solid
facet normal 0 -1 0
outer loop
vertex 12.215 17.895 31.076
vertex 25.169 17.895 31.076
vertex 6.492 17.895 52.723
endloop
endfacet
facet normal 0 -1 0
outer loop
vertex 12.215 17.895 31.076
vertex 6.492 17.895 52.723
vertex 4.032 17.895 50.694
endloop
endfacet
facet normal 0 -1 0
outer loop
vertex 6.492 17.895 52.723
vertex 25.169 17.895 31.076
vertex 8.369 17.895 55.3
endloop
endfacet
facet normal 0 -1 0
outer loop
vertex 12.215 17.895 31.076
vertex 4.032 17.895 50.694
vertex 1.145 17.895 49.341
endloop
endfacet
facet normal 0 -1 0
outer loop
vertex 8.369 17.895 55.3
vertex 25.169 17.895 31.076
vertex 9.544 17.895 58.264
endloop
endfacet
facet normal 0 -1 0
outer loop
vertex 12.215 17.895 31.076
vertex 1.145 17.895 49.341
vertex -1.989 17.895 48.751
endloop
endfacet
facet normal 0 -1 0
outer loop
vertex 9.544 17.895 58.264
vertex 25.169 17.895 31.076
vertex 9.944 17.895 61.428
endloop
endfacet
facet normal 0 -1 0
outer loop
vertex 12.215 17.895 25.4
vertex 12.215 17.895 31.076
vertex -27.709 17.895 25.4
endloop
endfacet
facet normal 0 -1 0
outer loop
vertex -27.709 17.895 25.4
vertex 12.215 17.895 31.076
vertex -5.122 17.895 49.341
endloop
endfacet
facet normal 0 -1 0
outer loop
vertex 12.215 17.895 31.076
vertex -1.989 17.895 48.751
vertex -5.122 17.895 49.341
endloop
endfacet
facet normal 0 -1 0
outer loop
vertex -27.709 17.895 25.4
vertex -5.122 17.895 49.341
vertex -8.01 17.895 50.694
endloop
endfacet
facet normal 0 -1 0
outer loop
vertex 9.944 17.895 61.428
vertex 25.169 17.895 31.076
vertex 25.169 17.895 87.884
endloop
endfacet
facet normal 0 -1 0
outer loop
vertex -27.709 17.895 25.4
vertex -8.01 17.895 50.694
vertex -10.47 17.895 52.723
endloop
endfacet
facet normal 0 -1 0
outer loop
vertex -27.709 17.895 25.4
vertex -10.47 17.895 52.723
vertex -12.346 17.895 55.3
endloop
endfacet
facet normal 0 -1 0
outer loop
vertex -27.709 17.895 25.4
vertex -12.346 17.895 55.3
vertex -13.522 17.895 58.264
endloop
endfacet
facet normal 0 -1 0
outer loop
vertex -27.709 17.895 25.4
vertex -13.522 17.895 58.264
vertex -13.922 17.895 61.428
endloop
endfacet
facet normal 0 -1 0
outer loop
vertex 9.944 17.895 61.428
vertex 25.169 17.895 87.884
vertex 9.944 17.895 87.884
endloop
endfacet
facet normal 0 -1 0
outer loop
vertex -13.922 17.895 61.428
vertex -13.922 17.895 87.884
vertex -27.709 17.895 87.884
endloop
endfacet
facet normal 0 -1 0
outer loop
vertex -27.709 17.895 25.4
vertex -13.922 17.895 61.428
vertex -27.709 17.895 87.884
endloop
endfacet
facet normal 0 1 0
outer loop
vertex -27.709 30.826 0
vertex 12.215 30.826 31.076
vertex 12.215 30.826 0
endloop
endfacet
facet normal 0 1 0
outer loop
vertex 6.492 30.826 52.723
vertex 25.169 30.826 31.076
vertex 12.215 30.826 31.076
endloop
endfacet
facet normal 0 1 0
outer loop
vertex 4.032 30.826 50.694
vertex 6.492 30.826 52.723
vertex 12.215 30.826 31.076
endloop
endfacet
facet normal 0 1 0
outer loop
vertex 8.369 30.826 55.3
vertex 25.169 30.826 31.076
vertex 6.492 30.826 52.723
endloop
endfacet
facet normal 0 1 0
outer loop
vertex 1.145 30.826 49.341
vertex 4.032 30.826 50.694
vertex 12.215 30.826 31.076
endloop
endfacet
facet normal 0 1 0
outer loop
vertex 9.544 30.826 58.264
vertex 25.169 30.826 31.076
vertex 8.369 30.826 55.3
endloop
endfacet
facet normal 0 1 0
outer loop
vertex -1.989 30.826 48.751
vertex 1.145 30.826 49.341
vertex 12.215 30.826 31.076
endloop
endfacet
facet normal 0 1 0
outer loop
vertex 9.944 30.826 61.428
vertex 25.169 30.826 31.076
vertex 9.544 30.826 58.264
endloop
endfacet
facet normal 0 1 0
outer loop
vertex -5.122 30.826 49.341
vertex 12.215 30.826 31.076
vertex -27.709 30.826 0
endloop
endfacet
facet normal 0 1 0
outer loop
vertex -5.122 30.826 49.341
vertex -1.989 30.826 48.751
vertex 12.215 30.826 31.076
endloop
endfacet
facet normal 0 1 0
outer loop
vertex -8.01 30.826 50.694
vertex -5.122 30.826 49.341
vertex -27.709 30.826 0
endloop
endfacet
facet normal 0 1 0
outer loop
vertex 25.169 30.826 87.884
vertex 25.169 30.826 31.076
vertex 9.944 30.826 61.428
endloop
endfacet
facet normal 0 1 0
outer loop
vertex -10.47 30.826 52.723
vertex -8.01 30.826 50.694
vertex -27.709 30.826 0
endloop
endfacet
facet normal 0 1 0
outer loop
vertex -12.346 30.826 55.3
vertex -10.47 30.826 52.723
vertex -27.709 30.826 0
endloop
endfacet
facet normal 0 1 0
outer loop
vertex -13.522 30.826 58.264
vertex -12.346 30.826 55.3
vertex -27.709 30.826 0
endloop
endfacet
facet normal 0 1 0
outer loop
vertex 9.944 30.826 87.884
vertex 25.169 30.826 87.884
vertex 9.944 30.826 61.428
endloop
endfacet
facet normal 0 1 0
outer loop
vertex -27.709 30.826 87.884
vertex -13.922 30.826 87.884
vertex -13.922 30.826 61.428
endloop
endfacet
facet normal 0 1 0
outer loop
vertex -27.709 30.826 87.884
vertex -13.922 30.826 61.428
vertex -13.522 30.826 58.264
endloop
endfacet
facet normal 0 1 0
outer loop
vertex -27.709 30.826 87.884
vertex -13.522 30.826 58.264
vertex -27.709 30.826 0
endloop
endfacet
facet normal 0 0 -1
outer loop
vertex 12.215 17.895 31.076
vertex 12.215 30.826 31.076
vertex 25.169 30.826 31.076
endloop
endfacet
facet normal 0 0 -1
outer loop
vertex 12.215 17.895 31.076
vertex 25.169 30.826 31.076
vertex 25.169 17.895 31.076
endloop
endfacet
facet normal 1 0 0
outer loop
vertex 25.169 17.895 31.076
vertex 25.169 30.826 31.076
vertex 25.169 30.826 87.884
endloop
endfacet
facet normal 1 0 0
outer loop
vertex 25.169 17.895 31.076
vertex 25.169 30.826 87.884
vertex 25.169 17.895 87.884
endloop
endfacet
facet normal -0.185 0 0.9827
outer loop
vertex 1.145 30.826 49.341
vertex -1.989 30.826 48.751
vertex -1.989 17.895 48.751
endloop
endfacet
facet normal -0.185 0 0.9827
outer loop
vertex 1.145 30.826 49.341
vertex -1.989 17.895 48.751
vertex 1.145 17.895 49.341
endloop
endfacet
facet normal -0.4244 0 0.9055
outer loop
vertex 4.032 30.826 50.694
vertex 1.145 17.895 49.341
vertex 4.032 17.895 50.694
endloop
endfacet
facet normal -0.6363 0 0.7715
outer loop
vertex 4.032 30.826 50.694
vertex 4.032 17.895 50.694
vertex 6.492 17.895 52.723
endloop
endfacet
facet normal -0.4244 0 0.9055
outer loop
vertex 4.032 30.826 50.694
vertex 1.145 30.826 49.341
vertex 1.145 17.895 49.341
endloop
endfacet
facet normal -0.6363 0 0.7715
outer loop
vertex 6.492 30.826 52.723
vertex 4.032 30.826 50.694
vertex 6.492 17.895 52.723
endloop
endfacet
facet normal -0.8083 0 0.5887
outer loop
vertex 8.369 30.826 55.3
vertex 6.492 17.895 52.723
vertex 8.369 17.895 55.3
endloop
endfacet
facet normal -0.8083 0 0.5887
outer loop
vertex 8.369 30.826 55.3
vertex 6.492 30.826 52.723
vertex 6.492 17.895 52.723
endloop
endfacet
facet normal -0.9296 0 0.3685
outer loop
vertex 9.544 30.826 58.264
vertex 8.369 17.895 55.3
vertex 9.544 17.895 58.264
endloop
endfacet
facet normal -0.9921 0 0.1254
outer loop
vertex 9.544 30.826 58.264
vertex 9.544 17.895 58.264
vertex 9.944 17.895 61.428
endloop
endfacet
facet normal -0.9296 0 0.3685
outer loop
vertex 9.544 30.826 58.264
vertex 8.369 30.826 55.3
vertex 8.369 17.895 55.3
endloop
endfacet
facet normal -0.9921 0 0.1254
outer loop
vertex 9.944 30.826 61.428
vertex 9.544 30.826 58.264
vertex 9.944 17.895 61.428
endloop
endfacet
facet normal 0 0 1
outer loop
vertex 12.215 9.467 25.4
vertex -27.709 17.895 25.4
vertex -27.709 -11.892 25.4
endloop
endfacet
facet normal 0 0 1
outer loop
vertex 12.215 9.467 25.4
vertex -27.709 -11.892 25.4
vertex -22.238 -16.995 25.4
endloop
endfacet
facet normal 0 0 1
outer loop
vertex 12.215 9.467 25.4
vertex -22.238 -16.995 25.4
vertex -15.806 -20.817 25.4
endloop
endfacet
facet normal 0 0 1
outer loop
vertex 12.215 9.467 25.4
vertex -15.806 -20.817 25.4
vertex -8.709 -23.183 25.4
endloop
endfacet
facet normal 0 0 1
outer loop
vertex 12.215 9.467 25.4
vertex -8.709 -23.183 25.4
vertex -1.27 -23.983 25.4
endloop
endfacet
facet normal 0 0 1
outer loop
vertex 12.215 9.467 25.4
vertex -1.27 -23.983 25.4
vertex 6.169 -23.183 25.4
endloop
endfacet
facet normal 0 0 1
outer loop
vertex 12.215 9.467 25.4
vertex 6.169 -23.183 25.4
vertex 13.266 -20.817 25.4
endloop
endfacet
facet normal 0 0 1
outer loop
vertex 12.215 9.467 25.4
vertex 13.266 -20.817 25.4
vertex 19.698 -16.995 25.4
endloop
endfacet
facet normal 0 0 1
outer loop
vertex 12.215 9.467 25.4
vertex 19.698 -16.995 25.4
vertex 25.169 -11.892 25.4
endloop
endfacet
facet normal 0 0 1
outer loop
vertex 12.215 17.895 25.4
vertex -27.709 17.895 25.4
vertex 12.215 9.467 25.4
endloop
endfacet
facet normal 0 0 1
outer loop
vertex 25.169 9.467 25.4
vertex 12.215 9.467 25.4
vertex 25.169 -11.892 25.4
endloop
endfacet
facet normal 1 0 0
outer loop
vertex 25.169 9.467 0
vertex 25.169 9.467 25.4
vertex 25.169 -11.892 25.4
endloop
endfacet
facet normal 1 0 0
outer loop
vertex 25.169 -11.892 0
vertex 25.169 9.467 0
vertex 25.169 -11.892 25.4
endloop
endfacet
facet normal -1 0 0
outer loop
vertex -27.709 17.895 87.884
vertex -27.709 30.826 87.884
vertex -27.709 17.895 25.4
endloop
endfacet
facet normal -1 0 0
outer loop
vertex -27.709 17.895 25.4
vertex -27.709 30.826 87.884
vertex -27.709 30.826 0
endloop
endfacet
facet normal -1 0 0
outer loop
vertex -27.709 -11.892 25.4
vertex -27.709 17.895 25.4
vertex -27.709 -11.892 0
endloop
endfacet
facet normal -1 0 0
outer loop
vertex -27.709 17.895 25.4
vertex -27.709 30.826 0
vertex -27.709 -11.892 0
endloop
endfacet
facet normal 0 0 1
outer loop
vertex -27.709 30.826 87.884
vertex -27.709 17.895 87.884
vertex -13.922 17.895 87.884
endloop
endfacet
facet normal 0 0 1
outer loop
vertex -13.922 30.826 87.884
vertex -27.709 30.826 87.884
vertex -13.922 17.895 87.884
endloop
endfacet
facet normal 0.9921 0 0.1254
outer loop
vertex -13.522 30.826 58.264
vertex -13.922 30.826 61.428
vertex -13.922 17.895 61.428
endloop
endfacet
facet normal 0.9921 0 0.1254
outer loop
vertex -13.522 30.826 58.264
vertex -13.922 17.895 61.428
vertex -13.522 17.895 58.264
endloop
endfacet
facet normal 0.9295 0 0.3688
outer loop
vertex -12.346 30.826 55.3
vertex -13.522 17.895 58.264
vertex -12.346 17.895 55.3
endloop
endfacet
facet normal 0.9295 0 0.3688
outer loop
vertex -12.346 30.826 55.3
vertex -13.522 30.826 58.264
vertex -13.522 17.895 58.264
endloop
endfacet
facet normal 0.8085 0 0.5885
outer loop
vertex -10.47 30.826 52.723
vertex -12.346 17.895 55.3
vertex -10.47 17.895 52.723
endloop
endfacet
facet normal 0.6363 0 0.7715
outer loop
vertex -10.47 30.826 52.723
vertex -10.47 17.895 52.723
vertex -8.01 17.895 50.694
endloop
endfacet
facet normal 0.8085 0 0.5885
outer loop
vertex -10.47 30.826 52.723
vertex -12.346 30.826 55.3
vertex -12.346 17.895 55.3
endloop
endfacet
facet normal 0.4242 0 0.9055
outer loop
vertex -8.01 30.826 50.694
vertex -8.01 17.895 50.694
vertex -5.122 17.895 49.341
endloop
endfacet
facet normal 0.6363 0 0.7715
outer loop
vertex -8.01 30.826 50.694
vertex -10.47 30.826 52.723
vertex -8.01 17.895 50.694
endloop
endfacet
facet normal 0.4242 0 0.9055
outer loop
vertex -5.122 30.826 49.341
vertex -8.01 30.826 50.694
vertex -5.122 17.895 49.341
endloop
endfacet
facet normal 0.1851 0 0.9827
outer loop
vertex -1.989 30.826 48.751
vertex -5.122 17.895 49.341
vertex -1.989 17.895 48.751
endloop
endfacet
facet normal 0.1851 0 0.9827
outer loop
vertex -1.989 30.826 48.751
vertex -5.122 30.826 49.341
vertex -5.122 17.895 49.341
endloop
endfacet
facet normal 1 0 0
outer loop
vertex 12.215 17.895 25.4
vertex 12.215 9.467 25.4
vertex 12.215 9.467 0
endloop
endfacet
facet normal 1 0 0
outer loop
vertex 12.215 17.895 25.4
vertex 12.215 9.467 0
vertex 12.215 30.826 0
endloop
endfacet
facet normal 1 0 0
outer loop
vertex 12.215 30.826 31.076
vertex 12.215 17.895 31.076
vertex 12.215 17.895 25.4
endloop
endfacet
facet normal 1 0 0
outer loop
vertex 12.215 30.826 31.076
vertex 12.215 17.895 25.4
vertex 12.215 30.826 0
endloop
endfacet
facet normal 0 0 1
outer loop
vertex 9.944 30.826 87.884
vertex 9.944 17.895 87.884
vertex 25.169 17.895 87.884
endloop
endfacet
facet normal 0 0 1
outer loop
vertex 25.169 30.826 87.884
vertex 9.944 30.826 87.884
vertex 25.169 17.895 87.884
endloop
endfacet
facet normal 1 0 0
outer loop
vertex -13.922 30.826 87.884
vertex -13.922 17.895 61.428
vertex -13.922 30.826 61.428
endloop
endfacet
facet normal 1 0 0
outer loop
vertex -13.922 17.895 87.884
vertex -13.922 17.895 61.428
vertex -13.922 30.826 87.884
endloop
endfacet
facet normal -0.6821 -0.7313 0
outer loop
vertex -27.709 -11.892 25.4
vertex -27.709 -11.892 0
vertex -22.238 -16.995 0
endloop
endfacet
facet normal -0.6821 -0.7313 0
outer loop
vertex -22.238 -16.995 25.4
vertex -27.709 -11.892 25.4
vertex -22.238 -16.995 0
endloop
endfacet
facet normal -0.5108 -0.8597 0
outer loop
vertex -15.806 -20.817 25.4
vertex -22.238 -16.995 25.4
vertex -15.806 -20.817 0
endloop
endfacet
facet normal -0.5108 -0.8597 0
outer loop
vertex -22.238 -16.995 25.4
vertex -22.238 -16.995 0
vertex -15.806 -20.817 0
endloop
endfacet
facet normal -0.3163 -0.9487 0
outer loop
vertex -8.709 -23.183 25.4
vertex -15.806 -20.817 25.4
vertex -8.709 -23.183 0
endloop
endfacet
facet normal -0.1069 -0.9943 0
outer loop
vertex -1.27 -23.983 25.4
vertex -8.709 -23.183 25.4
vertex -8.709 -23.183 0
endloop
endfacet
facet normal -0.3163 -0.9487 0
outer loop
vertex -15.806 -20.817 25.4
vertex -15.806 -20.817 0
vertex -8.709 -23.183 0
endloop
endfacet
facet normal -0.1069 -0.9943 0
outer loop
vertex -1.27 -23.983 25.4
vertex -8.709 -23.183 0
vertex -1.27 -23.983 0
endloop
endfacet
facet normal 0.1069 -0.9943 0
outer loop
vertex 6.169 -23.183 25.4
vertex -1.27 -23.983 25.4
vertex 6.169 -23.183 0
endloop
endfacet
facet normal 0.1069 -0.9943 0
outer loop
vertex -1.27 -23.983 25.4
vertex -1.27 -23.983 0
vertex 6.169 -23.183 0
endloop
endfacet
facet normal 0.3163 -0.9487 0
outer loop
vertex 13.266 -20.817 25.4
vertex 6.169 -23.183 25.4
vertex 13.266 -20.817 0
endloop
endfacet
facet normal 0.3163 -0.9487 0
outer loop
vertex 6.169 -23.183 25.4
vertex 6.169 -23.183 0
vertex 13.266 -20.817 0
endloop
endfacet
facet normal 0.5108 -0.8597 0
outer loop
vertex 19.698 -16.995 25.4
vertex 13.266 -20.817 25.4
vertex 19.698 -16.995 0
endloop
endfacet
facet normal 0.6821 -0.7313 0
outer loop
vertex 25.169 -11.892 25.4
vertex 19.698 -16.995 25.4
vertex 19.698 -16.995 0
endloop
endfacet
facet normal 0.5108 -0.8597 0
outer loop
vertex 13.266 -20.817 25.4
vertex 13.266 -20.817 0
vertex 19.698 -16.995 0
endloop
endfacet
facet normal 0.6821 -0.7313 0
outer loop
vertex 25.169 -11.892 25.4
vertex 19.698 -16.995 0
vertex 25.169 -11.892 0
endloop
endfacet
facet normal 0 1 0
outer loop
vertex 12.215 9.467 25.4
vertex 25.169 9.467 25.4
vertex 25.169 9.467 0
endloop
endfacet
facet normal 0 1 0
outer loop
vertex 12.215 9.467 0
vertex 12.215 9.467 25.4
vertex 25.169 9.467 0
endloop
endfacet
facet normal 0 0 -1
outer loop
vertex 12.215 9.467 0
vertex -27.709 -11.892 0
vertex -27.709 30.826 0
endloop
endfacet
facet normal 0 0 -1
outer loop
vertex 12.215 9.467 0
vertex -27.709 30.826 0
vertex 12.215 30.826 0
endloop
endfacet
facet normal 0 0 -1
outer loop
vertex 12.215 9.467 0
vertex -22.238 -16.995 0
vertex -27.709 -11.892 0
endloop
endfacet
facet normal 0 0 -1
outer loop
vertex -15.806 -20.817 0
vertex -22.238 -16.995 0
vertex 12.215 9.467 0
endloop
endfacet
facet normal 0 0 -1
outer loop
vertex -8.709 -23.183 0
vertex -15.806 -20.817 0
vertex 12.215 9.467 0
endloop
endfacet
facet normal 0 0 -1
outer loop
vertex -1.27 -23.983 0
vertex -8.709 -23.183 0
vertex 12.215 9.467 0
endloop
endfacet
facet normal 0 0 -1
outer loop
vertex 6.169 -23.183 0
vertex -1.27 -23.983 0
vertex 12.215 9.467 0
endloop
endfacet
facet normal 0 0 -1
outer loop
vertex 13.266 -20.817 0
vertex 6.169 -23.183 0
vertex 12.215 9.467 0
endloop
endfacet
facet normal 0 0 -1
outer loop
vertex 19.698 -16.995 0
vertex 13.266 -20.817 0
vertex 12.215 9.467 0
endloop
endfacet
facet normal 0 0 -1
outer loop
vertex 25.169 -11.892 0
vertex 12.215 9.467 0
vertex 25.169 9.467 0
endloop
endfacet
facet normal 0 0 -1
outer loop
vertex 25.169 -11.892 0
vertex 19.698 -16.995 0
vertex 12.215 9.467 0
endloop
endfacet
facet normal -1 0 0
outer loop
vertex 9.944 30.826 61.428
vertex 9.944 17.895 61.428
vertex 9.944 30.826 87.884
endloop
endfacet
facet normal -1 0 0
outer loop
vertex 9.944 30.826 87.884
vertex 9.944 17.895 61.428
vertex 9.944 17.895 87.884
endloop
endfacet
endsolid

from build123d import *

# Parameters (mm, degrees)
F1_DEPTH    = 25.4
F2_W        = 52.878184244
F2_H        = 12.9309091717
F3_DEPTH    = 87.884
F4_W        = 23.8667652011
F4_H        = 39.1564019587
F5_DEPTH    = 25.4
F6_T1_DEPTH = 12.9309091717
F8_DEPTH    = 12.954


# Not quite as in the source:
# - a fillet or chamfer that OpenCascade refuses, or shapes differently, is made with other operations: its cross-section is extruded or revolved along the edge and cut away or added


with BuildPart() as f1:
    # F0 (on Top) → F1 (new body)
    with BuildSketch(Plane.XY):
        with BuildLine():
            Line((25.1690931618, 17.8954545408), (-27.7090910822, 17.8954545408))
            Line((-27.7090910822, 17.8954545408), (-27.7090910822, -11.891817674))
            ThreePointArc((-27.7090910822, -11.891817674), (-1.2699989602, -23.9832848769), (25.1690931618, -11.891817674))
            Line((25.1690931618, -11.891817674), (25.1690931618, 17.8954545408))
        make_face()
    extrude(amount=F1_DEPTH)

    # F2 (on face) → F3 (join)
    with BuildSketch(Plane(origin=(0, 0, 0), x_dir=(1, 0, 0), z_dir=(0, 0, -1))):
        with Locations((-1.2699989602, -24.3609091267)):
            Rectangle(F2_W, F2_H)
    extrude(amount=-F3_DEPTH)

    # F4 (on face) → F5 (cut)
    with BuildSketch(Plane.XZ.offset(-17.8954545408)):
        with Locations((-1.9888961688, 68.3057990206)):
            Rectangle(F4_W, F4_H)
    extrude(amount=-F5_DEPTH, mode=Mode.SUBTRACT)

    # F6: fillet of radius 12.7 on 2 edges, made by hand

    # F6_s2 → F6_t1 (join)
    with BuildSketch(Plane.XZ.offset(-30.8263637125)):
        with BuildLine():
            ThreePointArc((-13.9222787693, 61.4275980413), (-10.2025348904, 52.4473419202), (-1.2222787693, 48.7275980413))
            Line((-1.2222787693, 48.7275980413), (-13.9222787693, 48.7275980413))
            Line((-13.9222787693, 48.7275980413), (-13.9222787693, 61.4275980413))
        make_face()
        with BuildLine():
            ThreePointArc((-2.7555135682, 48.7275980413), (6.2247425528, 52.4473419202), (9.9444864318, 61.4275980413))
            Line((9.9444864318, 61.4275980413), (9.9444864318, 48.7275980413))
            Line((9.9444864318, 48.7275980413), (-2.7555135682, 48.7275980413))
        make_face()
    extrude(amount=F6_T1_DEPTH)

    # F7 (on face) → F8 (cut)
    with BuildSketch(Plane.YZ.offset(25.1690931618)):
        Polygon((30.8263637125, 0), (30.8263637125, 31.0761313885), (17.8954545408, 31.0761313885), (17.8954545408, 25.4), (9.4672730193, 25.4), (9.4672730193, 0), align=None)
    extrude(amount=-F8_DEPTH, mode=Mode.SUBTRACT)


solid = f1.part
